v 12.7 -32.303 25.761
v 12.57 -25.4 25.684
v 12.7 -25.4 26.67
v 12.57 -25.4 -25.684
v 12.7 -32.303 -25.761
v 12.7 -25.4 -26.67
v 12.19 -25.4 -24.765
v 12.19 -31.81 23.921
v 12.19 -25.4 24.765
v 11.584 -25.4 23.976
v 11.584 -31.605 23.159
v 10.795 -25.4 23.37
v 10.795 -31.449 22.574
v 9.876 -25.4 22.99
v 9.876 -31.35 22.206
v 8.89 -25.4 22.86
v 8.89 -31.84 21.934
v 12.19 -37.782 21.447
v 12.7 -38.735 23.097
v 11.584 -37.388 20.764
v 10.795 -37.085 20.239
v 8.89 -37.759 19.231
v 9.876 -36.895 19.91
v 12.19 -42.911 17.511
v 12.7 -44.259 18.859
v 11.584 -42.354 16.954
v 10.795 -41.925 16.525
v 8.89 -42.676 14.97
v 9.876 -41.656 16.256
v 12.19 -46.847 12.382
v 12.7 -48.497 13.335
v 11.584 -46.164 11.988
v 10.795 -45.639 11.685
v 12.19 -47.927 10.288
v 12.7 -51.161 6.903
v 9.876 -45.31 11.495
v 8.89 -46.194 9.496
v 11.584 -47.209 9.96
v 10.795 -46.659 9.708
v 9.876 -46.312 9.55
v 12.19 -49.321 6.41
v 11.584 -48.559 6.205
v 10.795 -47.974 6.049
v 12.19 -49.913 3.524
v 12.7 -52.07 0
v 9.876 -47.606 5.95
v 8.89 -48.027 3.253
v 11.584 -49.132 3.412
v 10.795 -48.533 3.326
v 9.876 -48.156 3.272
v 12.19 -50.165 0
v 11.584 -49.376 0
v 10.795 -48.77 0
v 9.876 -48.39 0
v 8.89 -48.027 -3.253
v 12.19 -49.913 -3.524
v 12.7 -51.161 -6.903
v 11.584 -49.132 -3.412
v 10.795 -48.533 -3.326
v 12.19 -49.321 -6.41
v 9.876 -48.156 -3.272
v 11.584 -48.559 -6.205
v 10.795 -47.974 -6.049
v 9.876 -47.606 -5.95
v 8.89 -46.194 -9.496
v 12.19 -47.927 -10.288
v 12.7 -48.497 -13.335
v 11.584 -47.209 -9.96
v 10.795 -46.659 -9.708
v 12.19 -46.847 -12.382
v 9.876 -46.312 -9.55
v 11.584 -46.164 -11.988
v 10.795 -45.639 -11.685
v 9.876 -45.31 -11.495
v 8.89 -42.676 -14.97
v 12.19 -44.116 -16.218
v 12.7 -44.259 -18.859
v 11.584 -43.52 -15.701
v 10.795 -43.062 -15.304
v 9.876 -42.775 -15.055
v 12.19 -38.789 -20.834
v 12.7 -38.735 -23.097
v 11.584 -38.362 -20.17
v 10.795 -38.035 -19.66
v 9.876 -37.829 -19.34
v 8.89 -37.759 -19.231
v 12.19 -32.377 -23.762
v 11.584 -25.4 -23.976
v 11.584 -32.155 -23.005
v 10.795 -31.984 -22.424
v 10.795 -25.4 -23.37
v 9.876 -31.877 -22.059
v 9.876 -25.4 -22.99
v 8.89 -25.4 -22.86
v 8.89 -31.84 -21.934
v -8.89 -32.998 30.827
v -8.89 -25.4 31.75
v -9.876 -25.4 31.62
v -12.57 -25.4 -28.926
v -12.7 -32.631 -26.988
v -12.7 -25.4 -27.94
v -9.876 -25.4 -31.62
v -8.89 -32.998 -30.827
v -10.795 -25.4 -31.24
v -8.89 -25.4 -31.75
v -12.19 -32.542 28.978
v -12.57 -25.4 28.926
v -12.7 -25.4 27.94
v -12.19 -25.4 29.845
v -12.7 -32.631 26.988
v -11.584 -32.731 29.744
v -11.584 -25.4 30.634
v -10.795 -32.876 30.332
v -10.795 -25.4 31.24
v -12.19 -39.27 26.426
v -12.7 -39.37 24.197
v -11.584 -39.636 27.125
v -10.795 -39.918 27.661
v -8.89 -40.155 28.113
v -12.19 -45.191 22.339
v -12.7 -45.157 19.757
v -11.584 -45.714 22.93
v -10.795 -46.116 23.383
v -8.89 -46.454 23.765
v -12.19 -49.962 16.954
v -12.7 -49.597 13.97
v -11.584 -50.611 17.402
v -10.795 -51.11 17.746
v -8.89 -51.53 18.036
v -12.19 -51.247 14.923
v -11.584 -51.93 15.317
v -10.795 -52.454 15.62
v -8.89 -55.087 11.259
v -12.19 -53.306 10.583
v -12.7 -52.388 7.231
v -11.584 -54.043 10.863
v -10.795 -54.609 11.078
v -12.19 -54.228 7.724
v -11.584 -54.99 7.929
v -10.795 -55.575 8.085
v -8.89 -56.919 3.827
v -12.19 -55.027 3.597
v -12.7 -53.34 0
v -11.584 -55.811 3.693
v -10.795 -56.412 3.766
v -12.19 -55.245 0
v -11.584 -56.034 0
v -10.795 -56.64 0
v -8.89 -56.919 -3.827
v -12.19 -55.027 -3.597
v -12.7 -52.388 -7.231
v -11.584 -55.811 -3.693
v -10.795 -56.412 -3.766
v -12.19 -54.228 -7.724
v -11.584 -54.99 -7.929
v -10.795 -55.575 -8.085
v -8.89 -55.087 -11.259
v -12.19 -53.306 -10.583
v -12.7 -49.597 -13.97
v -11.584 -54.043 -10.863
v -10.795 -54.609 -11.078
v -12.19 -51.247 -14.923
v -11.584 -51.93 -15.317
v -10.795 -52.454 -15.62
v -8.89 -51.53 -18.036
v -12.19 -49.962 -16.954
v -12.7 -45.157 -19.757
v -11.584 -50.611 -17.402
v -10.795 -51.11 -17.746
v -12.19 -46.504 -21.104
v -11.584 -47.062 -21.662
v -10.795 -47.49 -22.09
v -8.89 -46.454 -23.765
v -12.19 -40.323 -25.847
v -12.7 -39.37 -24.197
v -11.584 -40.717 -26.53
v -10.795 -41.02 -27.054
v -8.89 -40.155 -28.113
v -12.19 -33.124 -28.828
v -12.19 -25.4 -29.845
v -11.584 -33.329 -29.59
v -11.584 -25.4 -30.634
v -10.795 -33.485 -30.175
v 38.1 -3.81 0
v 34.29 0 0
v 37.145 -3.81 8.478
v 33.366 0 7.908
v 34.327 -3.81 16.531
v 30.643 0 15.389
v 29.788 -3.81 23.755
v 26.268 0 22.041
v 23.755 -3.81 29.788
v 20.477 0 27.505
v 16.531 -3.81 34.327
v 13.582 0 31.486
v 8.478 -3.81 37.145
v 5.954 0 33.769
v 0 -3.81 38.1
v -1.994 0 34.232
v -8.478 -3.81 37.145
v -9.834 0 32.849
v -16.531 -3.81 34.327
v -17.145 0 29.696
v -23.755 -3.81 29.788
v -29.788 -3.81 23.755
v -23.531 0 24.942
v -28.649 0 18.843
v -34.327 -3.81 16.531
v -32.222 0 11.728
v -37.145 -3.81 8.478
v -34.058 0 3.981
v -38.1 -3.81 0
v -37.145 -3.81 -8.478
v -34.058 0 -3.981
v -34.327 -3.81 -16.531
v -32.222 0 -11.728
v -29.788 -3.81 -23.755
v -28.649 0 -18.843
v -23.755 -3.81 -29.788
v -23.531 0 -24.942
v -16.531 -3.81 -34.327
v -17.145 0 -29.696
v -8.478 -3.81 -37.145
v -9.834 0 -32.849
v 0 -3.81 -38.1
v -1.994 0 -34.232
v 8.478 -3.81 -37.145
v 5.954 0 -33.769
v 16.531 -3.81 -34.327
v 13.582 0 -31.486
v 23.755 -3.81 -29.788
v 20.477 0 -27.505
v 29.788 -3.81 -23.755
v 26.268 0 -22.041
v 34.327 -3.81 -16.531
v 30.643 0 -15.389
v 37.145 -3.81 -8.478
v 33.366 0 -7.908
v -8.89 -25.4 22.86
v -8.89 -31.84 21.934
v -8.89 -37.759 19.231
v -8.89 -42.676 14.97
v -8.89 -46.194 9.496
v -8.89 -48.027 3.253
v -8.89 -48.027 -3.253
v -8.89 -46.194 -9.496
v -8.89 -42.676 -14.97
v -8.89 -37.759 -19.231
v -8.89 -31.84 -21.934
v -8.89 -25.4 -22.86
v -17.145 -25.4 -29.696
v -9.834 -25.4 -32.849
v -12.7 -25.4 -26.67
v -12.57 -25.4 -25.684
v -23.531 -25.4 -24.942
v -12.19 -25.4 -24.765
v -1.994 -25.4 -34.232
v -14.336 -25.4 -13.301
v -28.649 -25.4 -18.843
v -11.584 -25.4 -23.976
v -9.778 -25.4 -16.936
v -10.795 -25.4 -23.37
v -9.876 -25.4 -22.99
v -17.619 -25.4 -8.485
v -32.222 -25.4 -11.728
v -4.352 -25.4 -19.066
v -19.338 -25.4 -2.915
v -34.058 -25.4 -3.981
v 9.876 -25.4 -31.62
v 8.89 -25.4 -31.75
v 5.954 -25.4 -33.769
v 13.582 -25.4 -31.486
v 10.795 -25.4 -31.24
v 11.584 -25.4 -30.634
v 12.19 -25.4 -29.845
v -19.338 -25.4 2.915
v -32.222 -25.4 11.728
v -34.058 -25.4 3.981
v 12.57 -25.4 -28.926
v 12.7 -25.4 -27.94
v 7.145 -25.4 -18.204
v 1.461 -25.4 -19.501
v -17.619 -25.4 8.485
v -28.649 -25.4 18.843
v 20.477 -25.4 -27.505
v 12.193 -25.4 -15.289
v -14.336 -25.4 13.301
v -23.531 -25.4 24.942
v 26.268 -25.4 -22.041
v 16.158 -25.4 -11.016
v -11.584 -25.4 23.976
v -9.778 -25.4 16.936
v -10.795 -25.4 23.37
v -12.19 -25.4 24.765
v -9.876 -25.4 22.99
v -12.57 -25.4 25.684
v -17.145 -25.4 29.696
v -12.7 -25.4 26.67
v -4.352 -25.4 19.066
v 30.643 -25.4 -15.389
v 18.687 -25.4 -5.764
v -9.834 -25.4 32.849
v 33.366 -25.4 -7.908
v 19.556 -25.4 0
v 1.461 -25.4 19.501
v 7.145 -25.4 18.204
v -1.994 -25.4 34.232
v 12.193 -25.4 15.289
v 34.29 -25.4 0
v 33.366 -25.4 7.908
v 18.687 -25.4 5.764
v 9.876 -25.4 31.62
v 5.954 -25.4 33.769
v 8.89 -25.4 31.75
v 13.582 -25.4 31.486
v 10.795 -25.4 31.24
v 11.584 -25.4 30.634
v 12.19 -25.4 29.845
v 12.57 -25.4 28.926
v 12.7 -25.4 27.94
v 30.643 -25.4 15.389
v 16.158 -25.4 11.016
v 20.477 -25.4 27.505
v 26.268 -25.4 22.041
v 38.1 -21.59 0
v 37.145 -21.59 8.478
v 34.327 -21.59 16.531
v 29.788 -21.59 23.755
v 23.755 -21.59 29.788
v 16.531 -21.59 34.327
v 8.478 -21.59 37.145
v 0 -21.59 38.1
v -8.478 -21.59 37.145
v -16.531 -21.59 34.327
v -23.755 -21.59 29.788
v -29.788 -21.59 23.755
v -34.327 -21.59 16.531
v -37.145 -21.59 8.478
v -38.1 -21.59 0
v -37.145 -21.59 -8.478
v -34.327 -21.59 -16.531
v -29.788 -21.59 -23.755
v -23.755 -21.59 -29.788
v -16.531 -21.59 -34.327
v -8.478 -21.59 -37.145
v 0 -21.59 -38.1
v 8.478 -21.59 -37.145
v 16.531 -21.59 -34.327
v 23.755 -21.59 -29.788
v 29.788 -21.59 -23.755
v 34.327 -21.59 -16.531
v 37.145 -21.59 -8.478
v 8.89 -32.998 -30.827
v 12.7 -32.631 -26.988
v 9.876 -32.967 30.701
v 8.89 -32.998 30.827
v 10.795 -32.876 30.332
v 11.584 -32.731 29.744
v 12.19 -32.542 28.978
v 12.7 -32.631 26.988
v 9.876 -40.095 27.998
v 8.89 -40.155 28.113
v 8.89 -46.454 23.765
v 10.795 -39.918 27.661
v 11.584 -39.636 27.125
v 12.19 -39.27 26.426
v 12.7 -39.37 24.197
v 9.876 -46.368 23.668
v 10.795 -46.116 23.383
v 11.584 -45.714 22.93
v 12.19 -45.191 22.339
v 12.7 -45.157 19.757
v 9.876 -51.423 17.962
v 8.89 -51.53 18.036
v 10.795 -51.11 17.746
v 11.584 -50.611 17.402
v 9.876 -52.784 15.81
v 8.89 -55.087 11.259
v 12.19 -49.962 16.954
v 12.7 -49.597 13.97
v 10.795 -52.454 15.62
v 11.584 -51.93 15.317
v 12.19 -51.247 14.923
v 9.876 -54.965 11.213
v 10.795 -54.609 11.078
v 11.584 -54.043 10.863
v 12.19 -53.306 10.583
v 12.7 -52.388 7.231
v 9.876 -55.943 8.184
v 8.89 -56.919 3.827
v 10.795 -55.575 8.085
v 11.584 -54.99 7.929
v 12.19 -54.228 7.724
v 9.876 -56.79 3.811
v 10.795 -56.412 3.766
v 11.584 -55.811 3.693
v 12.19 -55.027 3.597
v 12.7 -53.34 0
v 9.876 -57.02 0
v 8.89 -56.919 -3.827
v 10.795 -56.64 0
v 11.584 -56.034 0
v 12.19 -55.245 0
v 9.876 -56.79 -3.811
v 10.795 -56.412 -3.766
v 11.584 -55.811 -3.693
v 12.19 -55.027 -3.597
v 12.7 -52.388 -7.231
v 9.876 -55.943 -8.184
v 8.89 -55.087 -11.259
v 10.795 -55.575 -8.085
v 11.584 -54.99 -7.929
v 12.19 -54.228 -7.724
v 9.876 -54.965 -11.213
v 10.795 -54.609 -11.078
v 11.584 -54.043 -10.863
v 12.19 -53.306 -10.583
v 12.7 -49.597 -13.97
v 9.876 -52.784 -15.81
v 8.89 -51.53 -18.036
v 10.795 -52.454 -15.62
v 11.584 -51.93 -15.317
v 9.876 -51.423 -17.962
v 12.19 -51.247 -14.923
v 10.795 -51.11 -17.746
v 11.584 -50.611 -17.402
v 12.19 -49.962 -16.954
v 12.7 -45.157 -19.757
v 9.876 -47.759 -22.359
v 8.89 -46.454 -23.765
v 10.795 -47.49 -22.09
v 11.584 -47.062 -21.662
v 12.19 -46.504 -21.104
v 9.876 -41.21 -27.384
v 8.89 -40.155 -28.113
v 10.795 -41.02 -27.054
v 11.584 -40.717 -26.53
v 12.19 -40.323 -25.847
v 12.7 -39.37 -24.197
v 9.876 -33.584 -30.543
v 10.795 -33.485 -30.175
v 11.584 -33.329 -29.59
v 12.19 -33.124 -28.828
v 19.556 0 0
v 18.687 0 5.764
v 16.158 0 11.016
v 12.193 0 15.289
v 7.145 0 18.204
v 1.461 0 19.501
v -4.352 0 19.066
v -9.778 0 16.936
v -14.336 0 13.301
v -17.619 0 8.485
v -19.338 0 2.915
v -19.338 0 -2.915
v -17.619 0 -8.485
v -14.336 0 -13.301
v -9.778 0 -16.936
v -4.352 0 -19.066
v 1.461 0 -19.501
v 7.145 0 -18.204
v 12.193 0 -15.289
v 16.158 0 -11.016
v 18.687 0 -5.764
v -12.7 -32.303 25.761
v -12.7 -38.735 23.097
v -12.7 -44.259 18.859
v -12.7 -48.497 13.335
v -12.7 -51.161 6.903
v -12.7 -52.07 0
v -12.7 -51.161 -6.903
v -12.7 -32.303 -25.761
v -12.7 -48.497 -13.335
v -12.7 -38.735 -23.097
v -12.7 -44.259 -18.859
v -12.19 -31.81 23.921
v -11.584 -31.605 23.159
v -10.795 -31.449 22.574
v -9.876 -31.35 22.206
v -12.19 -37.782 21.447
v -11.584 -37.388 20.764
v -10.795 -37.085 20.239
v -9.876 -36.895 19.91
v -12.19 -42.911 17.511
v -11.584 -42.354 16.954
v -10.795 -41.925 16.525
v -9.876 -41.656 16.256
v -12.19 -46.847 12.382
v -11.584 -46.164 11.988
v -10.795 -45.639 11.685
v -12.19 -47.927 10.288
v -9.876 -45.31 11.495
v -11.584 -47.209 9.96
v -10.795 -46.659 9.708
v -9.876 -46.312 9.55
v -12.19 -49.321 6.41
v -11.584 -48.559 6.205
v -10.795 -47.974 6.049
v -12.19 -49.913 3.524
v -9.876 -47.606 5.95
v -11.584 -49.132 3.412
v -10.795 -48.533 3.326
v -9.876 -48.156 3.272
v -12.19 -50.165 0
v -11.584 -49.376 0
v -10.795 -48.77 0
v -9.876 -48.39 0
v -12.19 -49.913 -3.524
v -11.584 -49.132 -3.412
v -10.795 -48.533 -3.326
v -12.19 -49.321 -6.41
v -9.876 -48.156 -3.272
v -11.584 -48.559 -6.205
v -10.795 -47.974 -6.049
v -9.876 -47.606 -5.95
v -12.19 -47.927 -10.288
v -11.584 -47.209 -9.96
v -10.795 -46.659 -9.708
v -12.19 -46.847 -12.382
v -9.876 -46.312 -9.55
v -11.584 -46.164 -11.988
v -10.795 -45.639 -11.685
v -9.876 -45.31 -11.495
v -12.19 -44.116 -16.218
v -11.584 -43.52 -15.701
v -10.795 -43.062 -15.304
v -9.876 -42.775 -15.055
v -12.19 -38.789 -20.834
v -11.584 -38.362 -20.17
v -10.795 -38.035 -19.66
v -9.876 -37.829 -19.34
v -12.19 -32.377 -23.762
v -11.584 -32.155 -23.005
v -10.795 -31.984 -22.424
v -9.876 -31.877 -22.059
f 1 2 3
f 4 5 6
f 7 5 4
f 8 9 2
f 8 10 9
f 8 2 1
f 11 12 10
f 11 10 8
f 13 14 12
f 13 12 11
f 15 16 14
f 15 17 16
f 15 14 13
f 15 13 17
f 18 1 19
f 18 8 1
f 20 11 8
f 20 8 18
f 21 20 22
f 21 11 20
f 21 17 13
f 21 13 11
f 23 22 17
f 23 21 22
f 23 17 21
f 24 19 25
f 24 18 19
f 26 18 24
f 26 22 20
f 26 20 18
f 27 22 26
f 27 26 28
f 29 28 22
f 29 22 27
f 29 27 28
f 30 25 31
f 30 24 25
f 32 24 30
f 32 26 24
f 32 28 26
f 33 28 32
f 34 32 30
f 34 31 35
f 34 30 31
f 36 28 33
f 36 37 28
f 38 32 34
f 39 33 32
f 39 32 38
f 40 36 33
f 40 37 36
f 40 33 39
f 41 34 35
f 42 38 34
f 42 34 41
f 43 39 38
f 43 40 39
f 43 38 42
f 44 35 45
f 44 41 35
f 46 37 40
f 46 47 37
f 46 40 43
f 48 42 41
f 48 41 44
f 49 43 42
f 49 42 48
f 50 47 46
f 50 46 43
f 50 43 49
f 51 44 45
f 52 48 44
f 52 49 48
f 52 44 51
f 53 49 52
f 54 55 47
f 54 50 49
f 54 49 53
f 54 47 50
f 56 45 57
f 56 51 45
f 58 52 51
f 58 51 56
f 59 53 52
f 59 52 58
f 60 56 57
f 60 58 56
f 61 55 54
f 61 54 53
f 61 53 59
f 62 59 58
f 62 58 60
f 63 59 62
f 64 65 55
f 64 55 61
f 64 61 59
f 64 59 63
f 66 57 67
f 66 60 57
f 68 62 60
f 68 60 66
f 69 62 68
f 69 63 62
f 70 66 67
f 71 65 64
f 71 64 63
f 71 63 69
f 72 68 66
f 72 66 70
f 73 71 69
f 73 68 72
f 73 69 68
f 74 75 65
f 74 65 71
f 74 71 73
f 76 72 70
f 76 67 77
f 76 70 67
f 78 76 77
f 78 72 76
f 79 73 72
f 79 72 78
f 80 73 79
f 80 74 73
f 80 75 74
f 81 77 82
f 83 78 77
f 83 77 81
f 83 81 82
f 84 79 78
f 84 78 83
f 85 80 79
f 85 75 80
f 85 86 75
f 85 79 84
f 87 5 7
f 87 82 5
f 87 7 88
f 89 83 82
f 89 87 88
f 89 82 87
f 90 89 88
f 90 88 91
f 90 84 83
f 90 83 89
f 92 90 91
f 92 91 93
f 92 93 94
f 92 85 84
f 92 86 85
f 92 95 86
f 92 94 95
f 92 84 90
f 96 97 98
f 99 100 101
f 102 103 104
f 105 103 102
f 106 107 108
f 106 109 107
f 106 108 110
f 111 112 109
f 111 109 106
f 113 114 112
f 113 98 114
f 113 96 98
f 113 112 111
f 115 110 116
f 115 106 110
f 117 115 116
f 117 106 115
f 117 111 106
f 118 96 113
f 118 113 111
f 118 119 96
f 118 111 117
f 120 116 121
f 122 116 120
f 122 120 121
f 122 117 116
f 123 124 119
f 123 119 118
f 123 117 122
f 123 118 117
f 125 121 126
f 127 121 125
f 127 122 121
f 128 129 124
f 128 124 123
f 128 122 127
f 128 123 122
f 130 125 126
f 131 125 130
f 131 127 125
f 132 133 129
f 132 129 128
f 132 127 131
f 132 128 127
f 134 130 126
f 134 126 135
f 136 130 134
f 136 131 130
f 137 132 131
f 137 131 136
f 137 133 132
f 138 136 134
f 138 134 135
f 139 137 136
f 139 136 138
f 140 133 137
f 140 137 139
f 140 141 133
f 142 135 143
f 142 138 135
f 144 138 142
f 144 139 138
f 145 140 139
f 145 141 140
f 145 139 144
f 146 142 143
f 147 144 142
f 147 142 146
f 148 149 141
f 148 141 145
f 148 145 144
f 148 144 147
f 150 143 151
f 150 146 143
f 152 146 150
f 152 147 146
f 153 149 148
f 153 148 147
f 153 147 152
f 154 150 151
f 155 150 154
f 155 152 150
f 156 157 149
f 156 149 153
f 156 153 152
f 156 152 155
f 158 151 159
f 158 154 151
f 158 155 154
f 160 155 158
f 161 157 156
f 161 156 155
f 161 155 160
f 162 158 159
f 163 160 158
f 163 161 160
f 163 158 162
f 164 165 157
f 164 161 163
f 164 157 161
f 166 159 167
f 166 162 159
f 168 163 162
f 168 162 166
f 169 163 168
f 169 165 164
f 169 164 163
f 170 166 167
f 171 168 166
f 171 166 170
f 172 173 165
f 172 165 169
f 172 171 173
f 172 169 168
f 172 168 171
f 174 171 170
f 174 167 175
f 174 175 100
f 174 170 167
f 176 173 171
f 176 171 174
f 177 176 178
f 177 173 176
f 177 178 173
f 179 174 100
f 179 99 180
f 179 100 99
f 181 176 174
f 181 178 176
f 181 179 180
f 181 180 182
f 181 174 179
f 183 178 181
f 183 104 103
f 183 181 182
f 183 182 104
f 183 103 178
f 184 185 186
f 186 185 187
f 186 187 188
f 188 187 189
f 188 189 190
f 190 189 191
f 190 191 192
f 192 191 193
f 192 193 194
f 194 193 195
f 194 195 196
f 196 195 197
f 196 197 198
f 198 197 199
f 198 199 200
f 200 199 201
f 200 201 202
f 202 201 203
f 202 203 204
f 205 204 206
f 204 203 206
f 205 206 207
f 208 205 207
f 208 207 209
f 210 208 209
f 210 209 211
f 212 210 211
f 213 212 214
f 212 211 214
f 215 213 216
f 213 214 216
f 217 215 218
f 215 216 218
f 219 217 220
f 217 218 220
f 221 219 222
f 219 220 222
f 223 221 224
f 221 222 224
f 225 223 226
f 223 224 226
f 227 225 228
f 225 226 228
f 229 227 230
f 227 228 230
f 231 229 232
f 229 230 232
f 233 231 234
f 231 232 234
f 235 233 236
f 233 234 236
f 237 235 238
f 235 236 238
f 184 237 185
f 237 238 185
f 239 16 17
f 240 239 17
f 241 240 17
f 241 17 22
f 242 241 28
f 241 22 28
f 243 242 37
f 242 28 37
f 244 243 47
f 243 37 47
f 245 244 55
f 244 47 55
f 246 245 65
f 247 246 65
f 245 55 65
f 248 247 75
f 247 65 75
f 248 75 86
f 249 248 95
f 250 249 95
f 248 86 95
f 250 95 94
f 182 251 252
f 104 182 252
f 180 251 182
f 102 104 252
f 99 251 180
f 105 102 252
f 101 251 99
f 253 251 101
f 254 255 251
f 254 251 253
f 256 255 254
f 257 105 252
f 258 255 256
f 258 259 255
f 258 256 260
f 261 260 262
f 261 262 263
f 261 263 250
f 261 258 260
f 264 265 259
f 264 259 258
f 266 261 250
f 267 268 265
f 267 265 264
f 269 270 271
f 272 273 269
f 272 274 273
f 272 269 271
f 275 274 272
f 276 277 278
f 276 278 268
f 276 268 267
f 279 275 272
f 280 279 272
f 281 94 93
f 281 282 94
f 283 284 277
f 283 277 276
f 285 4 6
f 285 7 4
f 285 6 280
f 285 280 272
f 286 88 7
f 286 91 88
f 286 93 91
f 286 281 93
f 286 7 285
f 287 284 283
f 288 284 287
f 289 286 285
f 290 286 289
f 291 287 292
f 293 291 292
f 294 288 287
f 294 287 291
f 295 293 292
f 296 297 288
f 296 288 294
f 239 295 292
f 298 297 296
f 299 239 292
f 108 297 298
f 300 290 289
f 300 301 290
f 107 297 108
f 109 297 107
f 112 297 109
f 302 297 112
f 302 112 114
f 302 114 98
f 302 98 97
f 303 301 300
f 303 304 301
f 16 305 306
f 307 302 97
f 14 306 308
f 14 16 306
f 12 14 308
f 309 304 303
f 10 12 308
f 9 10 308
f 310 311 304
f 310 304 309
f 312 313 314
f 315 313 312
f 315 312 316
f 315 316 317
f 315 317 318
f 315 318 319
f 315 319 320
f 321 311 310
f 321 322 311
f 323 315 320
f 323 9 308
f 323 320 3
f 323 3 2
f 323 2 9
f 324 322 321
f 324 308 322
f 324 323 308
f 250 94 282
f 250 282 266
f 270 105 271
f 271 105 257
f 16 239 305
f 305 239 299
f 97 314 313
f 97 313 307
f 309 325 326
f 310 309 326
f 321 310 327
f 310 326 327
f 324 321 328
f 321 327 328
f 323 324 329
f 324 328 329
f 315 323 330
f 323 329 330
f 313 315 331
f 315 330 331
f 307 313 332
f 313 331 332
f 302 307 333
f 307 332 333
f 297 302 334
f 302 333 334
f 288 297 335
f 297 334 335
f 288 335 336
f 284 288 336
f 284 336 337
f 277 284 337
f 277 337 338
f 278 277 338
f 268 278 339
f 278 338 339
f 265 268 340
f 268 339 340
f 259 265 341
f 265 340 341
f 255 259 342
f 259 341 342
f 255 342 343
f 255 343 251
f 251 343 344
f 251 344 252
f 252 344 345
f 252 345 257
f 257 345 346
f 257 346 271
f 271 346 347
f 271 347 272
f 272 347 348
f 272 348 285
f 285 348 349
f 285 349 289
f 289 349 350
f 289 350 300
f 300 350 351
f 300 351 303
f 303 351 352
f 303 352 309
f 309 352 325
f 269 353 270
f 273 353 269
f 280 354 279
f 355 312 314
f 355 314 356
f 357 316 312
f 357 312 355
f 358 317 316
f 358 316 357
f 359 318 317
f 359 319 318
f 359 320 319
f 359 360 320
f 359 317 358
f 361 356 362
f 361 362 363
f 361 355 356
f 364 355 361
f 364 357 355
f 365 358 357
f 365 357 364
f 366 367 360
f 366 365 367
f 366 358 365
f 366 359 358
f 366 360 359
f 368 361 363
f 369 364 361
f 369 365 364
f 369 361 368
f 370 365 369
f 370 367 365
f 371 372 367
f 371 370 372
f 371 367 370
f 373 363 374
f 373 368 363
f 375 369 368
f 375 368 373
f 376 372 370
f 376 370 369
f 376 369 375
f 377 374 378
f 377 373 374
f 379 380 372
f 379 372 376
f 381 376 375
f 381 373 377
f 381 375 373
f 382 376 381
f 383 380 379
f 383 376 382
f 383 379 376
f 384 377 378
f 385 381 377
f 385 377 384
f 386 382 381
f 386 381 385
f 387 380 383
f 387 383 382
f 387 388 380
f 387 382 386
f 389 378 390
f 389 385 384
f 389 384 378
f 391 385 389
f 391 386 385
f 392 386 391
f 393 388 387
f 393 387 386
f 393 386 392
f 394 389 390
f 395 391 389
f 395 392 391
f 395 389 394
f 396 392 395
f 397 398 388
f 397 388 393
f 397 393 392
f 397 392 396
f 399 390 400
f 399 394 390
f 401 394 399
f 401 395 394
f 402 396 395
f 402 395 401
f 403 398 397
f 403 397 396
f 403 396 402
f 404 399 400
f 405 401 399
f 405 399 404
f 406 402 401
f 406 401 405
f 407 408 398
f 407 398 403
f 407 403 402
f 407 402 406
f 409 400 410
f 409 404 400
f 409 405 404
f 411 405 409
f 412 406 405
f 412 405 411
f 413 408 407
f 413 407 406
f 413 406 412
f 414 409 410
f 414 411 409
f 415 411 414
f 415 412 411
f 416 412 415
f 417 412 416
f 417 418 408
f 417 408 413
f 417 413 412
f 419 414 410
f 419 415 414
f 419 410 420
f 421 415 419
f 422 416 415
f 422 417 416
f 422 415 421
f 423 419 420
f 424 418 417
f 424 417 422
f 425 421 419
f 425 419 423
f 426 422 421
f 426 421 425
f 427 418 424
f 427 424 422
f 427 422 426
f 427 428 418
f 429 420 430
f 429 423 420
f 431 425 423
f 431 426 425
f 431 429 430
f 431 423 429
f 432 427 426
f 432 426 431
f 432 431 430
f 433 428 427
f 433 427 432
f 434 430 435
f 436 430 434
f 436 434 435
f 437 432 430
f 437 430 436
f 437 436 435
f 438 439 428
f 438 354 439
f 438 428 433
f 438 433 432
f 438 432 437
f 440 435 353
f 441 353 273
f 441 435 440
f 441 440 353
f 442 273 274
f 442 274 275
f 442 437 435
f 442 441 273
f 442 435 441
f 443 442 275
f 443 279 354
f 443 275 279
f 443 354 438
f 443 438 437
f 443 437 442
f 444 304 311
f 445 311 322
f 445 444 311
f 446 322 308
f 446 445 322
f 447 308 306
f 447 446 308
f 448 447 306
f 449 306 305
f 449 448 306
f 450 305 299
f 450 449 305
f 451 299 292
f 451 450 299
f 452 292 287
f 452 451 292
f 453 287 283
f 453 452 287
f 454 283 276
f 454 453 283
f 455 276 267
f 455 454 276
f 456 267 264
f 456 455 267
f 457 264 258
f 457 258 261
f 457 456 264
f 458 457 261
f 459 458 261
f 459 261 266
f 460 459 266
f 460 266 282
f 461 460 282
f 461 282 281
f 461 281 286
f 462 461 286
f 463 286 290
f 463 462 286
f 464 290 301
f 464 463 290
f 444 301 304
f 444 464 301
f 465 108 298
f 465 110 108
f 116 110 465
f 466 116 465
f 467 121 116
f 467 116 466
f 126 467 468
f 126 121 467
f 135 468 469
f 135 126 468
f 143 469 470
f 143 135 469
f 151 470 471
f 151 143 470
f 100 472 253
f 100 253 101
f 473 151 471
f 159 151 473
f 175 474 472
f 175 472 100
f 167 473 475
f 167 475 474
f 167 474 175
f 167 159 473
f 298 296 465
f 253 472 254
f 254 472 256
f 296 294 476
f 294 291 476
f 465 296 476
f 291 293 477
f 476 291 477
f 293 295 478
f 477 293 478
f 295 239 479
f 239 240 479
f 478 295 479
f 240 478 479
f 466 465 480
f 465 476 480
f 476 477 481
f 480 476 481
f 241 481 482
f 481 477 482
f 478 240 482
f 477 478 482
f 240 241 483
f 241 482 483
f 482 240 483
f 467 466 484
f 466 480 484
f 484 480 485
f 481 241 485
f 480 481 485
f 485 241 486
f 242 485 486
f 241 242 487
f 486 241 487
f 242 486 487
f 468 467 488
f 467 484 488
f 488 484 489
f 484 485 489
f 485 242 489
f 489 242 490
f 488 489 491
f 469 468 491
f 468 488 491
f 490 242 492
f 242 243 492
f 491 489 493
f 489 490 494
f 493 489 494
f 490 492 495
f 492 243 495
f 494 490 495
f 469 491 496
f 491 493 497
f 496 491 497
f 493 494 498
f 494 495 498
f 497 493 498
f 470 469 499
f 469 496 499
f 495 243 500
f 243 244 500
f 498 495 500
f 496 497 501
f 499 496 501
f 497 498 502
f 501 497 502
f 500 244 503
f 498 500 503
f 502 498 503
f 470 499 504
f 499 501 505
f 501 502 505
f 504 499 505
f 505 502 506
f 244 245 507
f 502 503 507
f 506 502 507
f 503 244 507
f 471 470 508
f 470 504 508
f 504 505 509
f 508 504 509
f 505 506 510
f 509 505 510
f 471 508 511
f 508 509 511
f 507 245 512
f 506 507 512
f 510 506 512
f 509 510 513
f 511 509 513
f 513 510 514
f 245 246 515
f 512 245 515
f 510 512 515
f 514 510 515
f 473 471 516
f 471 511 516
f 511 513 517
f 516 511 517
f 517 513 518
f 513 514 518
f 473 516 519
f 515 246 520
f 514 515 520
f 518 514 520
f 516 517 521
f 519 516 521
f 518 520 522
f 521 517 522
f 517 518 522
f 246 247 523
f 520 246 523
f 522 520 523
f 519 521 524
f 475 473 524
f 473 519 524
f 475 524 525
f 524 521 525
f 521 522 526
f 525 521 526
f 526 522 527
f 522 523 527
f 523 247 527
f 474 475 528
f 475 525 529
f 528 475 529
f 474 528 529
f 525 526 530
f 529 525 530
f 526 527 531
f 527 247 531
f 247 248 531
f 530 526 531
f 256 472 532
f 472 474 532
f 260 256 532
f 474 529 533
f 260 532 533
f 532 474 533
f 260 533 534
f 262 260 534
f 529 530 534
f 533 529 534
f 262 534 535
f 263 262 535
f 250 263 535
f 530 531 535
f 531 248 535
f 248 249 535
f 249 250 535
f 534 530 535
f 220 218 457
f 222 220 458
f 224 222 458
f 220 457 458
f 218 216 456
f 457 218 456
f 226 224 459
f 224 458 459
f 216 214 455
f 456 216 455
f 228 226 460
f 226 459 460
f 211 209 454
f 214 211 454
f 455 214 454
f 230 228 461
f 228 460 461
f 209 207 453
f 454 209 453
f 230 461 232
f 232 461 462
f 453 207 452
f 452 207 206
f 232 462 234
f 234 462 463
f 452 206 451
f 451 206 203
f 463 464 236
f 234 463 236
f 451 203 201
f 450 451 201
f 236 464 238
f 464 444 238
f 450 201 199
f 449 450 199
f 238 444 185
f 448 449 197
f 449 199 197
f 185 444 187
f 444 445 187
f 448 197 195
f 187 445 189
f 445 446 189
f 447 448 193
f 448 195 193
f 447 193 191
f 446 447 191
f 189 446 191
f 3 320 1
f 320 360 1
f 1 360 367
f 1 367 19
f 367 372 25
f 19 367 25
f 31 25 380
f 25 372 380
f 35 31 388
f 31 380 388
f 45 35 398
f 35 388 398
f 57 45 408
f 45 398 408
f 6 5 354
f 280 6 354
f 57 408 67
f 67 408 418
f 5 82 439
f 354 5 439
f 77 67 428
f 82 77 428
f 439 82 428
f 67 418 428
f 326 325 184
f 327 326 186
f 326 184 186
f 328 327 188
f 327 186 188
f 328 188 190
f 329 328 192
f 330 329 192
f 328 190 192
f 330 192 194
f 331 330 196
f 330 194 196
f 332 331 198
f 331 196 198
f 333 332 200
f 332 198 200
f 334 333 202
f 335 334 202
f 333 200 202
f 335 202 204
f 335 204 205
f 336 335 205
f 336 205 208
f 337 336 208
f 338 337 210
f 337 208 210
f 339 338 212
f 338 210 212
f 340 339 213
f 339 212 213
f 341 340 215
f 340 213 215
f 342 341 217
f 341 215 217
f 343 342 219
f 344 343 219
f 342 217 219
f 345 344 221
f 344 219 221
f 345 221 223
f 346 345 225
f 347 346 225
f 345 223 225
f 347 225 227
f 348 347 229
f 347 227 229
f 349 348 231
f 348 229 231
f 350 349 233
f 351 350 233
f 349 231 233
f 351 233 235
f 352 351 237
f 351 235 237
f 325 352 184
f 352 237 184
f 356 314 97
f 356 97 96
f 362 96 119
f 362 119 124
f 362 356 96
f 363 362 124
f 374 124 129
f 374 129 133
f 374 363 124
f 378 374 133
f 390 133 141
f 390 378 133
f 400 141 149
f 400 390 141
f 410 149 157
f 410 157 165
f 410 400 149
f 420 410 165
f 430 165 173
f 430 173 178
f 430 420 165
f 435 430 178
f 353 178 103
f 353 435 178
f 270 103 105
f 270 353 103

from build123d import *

# Parameters (mm, degrees)
F0_R     = 38.1
F0_R_2   = 19.5559303257
F1_DEPTH = 25.4
F2_W     = 25.4
F2_H     = 8.8900010133
F3_ANGLE = 180
F4_R     = 3.81
F5_SIZE  = 3.81


with BuildPart() as f1:
    # F0 (on Front) → F1 (new body)
    with BuildSketch(Plane.XZ):
        Circle(F0_R)
        Circle(F0_R_2, mode=Mode.SUBTRACT)
    extrude(amount=F1_DEPTH)

    # F2 (on face) → F3 (revolve)
    with BuildSketch(Plane.XZ.offset(25.4)):
        with Locations((0, 27.3050005066)):
            Rectangle(F2_W, F2_H)
    revolve(axis=Axis((9.351817891, -25.4, 0), (1, 0, 0)), revolution_arc=F3_ANGLE)

    # F4
    f4_edges = [f1.edges().sort_by_distance(p)[0] for p in [
        (-12.7, -57.150001, 0),
        (12.7, -57.150001, 0),
        (12.7, -48.26, 0),
        (-12.7, -48.26, 0),
    ]]
    fillet(f4_edges, radius=F4_R)

    # F5
    f5_edges = [f1.edges().sort_by_distance(p)[0] for p in [
        (38.1, -12.7, 0),
        (-38.1, 0, 0),
        (-38.1, -25.4, 0),
    ]]
    chamfer(f5_edges, length=F5_SIZE)


solid = f1.part
